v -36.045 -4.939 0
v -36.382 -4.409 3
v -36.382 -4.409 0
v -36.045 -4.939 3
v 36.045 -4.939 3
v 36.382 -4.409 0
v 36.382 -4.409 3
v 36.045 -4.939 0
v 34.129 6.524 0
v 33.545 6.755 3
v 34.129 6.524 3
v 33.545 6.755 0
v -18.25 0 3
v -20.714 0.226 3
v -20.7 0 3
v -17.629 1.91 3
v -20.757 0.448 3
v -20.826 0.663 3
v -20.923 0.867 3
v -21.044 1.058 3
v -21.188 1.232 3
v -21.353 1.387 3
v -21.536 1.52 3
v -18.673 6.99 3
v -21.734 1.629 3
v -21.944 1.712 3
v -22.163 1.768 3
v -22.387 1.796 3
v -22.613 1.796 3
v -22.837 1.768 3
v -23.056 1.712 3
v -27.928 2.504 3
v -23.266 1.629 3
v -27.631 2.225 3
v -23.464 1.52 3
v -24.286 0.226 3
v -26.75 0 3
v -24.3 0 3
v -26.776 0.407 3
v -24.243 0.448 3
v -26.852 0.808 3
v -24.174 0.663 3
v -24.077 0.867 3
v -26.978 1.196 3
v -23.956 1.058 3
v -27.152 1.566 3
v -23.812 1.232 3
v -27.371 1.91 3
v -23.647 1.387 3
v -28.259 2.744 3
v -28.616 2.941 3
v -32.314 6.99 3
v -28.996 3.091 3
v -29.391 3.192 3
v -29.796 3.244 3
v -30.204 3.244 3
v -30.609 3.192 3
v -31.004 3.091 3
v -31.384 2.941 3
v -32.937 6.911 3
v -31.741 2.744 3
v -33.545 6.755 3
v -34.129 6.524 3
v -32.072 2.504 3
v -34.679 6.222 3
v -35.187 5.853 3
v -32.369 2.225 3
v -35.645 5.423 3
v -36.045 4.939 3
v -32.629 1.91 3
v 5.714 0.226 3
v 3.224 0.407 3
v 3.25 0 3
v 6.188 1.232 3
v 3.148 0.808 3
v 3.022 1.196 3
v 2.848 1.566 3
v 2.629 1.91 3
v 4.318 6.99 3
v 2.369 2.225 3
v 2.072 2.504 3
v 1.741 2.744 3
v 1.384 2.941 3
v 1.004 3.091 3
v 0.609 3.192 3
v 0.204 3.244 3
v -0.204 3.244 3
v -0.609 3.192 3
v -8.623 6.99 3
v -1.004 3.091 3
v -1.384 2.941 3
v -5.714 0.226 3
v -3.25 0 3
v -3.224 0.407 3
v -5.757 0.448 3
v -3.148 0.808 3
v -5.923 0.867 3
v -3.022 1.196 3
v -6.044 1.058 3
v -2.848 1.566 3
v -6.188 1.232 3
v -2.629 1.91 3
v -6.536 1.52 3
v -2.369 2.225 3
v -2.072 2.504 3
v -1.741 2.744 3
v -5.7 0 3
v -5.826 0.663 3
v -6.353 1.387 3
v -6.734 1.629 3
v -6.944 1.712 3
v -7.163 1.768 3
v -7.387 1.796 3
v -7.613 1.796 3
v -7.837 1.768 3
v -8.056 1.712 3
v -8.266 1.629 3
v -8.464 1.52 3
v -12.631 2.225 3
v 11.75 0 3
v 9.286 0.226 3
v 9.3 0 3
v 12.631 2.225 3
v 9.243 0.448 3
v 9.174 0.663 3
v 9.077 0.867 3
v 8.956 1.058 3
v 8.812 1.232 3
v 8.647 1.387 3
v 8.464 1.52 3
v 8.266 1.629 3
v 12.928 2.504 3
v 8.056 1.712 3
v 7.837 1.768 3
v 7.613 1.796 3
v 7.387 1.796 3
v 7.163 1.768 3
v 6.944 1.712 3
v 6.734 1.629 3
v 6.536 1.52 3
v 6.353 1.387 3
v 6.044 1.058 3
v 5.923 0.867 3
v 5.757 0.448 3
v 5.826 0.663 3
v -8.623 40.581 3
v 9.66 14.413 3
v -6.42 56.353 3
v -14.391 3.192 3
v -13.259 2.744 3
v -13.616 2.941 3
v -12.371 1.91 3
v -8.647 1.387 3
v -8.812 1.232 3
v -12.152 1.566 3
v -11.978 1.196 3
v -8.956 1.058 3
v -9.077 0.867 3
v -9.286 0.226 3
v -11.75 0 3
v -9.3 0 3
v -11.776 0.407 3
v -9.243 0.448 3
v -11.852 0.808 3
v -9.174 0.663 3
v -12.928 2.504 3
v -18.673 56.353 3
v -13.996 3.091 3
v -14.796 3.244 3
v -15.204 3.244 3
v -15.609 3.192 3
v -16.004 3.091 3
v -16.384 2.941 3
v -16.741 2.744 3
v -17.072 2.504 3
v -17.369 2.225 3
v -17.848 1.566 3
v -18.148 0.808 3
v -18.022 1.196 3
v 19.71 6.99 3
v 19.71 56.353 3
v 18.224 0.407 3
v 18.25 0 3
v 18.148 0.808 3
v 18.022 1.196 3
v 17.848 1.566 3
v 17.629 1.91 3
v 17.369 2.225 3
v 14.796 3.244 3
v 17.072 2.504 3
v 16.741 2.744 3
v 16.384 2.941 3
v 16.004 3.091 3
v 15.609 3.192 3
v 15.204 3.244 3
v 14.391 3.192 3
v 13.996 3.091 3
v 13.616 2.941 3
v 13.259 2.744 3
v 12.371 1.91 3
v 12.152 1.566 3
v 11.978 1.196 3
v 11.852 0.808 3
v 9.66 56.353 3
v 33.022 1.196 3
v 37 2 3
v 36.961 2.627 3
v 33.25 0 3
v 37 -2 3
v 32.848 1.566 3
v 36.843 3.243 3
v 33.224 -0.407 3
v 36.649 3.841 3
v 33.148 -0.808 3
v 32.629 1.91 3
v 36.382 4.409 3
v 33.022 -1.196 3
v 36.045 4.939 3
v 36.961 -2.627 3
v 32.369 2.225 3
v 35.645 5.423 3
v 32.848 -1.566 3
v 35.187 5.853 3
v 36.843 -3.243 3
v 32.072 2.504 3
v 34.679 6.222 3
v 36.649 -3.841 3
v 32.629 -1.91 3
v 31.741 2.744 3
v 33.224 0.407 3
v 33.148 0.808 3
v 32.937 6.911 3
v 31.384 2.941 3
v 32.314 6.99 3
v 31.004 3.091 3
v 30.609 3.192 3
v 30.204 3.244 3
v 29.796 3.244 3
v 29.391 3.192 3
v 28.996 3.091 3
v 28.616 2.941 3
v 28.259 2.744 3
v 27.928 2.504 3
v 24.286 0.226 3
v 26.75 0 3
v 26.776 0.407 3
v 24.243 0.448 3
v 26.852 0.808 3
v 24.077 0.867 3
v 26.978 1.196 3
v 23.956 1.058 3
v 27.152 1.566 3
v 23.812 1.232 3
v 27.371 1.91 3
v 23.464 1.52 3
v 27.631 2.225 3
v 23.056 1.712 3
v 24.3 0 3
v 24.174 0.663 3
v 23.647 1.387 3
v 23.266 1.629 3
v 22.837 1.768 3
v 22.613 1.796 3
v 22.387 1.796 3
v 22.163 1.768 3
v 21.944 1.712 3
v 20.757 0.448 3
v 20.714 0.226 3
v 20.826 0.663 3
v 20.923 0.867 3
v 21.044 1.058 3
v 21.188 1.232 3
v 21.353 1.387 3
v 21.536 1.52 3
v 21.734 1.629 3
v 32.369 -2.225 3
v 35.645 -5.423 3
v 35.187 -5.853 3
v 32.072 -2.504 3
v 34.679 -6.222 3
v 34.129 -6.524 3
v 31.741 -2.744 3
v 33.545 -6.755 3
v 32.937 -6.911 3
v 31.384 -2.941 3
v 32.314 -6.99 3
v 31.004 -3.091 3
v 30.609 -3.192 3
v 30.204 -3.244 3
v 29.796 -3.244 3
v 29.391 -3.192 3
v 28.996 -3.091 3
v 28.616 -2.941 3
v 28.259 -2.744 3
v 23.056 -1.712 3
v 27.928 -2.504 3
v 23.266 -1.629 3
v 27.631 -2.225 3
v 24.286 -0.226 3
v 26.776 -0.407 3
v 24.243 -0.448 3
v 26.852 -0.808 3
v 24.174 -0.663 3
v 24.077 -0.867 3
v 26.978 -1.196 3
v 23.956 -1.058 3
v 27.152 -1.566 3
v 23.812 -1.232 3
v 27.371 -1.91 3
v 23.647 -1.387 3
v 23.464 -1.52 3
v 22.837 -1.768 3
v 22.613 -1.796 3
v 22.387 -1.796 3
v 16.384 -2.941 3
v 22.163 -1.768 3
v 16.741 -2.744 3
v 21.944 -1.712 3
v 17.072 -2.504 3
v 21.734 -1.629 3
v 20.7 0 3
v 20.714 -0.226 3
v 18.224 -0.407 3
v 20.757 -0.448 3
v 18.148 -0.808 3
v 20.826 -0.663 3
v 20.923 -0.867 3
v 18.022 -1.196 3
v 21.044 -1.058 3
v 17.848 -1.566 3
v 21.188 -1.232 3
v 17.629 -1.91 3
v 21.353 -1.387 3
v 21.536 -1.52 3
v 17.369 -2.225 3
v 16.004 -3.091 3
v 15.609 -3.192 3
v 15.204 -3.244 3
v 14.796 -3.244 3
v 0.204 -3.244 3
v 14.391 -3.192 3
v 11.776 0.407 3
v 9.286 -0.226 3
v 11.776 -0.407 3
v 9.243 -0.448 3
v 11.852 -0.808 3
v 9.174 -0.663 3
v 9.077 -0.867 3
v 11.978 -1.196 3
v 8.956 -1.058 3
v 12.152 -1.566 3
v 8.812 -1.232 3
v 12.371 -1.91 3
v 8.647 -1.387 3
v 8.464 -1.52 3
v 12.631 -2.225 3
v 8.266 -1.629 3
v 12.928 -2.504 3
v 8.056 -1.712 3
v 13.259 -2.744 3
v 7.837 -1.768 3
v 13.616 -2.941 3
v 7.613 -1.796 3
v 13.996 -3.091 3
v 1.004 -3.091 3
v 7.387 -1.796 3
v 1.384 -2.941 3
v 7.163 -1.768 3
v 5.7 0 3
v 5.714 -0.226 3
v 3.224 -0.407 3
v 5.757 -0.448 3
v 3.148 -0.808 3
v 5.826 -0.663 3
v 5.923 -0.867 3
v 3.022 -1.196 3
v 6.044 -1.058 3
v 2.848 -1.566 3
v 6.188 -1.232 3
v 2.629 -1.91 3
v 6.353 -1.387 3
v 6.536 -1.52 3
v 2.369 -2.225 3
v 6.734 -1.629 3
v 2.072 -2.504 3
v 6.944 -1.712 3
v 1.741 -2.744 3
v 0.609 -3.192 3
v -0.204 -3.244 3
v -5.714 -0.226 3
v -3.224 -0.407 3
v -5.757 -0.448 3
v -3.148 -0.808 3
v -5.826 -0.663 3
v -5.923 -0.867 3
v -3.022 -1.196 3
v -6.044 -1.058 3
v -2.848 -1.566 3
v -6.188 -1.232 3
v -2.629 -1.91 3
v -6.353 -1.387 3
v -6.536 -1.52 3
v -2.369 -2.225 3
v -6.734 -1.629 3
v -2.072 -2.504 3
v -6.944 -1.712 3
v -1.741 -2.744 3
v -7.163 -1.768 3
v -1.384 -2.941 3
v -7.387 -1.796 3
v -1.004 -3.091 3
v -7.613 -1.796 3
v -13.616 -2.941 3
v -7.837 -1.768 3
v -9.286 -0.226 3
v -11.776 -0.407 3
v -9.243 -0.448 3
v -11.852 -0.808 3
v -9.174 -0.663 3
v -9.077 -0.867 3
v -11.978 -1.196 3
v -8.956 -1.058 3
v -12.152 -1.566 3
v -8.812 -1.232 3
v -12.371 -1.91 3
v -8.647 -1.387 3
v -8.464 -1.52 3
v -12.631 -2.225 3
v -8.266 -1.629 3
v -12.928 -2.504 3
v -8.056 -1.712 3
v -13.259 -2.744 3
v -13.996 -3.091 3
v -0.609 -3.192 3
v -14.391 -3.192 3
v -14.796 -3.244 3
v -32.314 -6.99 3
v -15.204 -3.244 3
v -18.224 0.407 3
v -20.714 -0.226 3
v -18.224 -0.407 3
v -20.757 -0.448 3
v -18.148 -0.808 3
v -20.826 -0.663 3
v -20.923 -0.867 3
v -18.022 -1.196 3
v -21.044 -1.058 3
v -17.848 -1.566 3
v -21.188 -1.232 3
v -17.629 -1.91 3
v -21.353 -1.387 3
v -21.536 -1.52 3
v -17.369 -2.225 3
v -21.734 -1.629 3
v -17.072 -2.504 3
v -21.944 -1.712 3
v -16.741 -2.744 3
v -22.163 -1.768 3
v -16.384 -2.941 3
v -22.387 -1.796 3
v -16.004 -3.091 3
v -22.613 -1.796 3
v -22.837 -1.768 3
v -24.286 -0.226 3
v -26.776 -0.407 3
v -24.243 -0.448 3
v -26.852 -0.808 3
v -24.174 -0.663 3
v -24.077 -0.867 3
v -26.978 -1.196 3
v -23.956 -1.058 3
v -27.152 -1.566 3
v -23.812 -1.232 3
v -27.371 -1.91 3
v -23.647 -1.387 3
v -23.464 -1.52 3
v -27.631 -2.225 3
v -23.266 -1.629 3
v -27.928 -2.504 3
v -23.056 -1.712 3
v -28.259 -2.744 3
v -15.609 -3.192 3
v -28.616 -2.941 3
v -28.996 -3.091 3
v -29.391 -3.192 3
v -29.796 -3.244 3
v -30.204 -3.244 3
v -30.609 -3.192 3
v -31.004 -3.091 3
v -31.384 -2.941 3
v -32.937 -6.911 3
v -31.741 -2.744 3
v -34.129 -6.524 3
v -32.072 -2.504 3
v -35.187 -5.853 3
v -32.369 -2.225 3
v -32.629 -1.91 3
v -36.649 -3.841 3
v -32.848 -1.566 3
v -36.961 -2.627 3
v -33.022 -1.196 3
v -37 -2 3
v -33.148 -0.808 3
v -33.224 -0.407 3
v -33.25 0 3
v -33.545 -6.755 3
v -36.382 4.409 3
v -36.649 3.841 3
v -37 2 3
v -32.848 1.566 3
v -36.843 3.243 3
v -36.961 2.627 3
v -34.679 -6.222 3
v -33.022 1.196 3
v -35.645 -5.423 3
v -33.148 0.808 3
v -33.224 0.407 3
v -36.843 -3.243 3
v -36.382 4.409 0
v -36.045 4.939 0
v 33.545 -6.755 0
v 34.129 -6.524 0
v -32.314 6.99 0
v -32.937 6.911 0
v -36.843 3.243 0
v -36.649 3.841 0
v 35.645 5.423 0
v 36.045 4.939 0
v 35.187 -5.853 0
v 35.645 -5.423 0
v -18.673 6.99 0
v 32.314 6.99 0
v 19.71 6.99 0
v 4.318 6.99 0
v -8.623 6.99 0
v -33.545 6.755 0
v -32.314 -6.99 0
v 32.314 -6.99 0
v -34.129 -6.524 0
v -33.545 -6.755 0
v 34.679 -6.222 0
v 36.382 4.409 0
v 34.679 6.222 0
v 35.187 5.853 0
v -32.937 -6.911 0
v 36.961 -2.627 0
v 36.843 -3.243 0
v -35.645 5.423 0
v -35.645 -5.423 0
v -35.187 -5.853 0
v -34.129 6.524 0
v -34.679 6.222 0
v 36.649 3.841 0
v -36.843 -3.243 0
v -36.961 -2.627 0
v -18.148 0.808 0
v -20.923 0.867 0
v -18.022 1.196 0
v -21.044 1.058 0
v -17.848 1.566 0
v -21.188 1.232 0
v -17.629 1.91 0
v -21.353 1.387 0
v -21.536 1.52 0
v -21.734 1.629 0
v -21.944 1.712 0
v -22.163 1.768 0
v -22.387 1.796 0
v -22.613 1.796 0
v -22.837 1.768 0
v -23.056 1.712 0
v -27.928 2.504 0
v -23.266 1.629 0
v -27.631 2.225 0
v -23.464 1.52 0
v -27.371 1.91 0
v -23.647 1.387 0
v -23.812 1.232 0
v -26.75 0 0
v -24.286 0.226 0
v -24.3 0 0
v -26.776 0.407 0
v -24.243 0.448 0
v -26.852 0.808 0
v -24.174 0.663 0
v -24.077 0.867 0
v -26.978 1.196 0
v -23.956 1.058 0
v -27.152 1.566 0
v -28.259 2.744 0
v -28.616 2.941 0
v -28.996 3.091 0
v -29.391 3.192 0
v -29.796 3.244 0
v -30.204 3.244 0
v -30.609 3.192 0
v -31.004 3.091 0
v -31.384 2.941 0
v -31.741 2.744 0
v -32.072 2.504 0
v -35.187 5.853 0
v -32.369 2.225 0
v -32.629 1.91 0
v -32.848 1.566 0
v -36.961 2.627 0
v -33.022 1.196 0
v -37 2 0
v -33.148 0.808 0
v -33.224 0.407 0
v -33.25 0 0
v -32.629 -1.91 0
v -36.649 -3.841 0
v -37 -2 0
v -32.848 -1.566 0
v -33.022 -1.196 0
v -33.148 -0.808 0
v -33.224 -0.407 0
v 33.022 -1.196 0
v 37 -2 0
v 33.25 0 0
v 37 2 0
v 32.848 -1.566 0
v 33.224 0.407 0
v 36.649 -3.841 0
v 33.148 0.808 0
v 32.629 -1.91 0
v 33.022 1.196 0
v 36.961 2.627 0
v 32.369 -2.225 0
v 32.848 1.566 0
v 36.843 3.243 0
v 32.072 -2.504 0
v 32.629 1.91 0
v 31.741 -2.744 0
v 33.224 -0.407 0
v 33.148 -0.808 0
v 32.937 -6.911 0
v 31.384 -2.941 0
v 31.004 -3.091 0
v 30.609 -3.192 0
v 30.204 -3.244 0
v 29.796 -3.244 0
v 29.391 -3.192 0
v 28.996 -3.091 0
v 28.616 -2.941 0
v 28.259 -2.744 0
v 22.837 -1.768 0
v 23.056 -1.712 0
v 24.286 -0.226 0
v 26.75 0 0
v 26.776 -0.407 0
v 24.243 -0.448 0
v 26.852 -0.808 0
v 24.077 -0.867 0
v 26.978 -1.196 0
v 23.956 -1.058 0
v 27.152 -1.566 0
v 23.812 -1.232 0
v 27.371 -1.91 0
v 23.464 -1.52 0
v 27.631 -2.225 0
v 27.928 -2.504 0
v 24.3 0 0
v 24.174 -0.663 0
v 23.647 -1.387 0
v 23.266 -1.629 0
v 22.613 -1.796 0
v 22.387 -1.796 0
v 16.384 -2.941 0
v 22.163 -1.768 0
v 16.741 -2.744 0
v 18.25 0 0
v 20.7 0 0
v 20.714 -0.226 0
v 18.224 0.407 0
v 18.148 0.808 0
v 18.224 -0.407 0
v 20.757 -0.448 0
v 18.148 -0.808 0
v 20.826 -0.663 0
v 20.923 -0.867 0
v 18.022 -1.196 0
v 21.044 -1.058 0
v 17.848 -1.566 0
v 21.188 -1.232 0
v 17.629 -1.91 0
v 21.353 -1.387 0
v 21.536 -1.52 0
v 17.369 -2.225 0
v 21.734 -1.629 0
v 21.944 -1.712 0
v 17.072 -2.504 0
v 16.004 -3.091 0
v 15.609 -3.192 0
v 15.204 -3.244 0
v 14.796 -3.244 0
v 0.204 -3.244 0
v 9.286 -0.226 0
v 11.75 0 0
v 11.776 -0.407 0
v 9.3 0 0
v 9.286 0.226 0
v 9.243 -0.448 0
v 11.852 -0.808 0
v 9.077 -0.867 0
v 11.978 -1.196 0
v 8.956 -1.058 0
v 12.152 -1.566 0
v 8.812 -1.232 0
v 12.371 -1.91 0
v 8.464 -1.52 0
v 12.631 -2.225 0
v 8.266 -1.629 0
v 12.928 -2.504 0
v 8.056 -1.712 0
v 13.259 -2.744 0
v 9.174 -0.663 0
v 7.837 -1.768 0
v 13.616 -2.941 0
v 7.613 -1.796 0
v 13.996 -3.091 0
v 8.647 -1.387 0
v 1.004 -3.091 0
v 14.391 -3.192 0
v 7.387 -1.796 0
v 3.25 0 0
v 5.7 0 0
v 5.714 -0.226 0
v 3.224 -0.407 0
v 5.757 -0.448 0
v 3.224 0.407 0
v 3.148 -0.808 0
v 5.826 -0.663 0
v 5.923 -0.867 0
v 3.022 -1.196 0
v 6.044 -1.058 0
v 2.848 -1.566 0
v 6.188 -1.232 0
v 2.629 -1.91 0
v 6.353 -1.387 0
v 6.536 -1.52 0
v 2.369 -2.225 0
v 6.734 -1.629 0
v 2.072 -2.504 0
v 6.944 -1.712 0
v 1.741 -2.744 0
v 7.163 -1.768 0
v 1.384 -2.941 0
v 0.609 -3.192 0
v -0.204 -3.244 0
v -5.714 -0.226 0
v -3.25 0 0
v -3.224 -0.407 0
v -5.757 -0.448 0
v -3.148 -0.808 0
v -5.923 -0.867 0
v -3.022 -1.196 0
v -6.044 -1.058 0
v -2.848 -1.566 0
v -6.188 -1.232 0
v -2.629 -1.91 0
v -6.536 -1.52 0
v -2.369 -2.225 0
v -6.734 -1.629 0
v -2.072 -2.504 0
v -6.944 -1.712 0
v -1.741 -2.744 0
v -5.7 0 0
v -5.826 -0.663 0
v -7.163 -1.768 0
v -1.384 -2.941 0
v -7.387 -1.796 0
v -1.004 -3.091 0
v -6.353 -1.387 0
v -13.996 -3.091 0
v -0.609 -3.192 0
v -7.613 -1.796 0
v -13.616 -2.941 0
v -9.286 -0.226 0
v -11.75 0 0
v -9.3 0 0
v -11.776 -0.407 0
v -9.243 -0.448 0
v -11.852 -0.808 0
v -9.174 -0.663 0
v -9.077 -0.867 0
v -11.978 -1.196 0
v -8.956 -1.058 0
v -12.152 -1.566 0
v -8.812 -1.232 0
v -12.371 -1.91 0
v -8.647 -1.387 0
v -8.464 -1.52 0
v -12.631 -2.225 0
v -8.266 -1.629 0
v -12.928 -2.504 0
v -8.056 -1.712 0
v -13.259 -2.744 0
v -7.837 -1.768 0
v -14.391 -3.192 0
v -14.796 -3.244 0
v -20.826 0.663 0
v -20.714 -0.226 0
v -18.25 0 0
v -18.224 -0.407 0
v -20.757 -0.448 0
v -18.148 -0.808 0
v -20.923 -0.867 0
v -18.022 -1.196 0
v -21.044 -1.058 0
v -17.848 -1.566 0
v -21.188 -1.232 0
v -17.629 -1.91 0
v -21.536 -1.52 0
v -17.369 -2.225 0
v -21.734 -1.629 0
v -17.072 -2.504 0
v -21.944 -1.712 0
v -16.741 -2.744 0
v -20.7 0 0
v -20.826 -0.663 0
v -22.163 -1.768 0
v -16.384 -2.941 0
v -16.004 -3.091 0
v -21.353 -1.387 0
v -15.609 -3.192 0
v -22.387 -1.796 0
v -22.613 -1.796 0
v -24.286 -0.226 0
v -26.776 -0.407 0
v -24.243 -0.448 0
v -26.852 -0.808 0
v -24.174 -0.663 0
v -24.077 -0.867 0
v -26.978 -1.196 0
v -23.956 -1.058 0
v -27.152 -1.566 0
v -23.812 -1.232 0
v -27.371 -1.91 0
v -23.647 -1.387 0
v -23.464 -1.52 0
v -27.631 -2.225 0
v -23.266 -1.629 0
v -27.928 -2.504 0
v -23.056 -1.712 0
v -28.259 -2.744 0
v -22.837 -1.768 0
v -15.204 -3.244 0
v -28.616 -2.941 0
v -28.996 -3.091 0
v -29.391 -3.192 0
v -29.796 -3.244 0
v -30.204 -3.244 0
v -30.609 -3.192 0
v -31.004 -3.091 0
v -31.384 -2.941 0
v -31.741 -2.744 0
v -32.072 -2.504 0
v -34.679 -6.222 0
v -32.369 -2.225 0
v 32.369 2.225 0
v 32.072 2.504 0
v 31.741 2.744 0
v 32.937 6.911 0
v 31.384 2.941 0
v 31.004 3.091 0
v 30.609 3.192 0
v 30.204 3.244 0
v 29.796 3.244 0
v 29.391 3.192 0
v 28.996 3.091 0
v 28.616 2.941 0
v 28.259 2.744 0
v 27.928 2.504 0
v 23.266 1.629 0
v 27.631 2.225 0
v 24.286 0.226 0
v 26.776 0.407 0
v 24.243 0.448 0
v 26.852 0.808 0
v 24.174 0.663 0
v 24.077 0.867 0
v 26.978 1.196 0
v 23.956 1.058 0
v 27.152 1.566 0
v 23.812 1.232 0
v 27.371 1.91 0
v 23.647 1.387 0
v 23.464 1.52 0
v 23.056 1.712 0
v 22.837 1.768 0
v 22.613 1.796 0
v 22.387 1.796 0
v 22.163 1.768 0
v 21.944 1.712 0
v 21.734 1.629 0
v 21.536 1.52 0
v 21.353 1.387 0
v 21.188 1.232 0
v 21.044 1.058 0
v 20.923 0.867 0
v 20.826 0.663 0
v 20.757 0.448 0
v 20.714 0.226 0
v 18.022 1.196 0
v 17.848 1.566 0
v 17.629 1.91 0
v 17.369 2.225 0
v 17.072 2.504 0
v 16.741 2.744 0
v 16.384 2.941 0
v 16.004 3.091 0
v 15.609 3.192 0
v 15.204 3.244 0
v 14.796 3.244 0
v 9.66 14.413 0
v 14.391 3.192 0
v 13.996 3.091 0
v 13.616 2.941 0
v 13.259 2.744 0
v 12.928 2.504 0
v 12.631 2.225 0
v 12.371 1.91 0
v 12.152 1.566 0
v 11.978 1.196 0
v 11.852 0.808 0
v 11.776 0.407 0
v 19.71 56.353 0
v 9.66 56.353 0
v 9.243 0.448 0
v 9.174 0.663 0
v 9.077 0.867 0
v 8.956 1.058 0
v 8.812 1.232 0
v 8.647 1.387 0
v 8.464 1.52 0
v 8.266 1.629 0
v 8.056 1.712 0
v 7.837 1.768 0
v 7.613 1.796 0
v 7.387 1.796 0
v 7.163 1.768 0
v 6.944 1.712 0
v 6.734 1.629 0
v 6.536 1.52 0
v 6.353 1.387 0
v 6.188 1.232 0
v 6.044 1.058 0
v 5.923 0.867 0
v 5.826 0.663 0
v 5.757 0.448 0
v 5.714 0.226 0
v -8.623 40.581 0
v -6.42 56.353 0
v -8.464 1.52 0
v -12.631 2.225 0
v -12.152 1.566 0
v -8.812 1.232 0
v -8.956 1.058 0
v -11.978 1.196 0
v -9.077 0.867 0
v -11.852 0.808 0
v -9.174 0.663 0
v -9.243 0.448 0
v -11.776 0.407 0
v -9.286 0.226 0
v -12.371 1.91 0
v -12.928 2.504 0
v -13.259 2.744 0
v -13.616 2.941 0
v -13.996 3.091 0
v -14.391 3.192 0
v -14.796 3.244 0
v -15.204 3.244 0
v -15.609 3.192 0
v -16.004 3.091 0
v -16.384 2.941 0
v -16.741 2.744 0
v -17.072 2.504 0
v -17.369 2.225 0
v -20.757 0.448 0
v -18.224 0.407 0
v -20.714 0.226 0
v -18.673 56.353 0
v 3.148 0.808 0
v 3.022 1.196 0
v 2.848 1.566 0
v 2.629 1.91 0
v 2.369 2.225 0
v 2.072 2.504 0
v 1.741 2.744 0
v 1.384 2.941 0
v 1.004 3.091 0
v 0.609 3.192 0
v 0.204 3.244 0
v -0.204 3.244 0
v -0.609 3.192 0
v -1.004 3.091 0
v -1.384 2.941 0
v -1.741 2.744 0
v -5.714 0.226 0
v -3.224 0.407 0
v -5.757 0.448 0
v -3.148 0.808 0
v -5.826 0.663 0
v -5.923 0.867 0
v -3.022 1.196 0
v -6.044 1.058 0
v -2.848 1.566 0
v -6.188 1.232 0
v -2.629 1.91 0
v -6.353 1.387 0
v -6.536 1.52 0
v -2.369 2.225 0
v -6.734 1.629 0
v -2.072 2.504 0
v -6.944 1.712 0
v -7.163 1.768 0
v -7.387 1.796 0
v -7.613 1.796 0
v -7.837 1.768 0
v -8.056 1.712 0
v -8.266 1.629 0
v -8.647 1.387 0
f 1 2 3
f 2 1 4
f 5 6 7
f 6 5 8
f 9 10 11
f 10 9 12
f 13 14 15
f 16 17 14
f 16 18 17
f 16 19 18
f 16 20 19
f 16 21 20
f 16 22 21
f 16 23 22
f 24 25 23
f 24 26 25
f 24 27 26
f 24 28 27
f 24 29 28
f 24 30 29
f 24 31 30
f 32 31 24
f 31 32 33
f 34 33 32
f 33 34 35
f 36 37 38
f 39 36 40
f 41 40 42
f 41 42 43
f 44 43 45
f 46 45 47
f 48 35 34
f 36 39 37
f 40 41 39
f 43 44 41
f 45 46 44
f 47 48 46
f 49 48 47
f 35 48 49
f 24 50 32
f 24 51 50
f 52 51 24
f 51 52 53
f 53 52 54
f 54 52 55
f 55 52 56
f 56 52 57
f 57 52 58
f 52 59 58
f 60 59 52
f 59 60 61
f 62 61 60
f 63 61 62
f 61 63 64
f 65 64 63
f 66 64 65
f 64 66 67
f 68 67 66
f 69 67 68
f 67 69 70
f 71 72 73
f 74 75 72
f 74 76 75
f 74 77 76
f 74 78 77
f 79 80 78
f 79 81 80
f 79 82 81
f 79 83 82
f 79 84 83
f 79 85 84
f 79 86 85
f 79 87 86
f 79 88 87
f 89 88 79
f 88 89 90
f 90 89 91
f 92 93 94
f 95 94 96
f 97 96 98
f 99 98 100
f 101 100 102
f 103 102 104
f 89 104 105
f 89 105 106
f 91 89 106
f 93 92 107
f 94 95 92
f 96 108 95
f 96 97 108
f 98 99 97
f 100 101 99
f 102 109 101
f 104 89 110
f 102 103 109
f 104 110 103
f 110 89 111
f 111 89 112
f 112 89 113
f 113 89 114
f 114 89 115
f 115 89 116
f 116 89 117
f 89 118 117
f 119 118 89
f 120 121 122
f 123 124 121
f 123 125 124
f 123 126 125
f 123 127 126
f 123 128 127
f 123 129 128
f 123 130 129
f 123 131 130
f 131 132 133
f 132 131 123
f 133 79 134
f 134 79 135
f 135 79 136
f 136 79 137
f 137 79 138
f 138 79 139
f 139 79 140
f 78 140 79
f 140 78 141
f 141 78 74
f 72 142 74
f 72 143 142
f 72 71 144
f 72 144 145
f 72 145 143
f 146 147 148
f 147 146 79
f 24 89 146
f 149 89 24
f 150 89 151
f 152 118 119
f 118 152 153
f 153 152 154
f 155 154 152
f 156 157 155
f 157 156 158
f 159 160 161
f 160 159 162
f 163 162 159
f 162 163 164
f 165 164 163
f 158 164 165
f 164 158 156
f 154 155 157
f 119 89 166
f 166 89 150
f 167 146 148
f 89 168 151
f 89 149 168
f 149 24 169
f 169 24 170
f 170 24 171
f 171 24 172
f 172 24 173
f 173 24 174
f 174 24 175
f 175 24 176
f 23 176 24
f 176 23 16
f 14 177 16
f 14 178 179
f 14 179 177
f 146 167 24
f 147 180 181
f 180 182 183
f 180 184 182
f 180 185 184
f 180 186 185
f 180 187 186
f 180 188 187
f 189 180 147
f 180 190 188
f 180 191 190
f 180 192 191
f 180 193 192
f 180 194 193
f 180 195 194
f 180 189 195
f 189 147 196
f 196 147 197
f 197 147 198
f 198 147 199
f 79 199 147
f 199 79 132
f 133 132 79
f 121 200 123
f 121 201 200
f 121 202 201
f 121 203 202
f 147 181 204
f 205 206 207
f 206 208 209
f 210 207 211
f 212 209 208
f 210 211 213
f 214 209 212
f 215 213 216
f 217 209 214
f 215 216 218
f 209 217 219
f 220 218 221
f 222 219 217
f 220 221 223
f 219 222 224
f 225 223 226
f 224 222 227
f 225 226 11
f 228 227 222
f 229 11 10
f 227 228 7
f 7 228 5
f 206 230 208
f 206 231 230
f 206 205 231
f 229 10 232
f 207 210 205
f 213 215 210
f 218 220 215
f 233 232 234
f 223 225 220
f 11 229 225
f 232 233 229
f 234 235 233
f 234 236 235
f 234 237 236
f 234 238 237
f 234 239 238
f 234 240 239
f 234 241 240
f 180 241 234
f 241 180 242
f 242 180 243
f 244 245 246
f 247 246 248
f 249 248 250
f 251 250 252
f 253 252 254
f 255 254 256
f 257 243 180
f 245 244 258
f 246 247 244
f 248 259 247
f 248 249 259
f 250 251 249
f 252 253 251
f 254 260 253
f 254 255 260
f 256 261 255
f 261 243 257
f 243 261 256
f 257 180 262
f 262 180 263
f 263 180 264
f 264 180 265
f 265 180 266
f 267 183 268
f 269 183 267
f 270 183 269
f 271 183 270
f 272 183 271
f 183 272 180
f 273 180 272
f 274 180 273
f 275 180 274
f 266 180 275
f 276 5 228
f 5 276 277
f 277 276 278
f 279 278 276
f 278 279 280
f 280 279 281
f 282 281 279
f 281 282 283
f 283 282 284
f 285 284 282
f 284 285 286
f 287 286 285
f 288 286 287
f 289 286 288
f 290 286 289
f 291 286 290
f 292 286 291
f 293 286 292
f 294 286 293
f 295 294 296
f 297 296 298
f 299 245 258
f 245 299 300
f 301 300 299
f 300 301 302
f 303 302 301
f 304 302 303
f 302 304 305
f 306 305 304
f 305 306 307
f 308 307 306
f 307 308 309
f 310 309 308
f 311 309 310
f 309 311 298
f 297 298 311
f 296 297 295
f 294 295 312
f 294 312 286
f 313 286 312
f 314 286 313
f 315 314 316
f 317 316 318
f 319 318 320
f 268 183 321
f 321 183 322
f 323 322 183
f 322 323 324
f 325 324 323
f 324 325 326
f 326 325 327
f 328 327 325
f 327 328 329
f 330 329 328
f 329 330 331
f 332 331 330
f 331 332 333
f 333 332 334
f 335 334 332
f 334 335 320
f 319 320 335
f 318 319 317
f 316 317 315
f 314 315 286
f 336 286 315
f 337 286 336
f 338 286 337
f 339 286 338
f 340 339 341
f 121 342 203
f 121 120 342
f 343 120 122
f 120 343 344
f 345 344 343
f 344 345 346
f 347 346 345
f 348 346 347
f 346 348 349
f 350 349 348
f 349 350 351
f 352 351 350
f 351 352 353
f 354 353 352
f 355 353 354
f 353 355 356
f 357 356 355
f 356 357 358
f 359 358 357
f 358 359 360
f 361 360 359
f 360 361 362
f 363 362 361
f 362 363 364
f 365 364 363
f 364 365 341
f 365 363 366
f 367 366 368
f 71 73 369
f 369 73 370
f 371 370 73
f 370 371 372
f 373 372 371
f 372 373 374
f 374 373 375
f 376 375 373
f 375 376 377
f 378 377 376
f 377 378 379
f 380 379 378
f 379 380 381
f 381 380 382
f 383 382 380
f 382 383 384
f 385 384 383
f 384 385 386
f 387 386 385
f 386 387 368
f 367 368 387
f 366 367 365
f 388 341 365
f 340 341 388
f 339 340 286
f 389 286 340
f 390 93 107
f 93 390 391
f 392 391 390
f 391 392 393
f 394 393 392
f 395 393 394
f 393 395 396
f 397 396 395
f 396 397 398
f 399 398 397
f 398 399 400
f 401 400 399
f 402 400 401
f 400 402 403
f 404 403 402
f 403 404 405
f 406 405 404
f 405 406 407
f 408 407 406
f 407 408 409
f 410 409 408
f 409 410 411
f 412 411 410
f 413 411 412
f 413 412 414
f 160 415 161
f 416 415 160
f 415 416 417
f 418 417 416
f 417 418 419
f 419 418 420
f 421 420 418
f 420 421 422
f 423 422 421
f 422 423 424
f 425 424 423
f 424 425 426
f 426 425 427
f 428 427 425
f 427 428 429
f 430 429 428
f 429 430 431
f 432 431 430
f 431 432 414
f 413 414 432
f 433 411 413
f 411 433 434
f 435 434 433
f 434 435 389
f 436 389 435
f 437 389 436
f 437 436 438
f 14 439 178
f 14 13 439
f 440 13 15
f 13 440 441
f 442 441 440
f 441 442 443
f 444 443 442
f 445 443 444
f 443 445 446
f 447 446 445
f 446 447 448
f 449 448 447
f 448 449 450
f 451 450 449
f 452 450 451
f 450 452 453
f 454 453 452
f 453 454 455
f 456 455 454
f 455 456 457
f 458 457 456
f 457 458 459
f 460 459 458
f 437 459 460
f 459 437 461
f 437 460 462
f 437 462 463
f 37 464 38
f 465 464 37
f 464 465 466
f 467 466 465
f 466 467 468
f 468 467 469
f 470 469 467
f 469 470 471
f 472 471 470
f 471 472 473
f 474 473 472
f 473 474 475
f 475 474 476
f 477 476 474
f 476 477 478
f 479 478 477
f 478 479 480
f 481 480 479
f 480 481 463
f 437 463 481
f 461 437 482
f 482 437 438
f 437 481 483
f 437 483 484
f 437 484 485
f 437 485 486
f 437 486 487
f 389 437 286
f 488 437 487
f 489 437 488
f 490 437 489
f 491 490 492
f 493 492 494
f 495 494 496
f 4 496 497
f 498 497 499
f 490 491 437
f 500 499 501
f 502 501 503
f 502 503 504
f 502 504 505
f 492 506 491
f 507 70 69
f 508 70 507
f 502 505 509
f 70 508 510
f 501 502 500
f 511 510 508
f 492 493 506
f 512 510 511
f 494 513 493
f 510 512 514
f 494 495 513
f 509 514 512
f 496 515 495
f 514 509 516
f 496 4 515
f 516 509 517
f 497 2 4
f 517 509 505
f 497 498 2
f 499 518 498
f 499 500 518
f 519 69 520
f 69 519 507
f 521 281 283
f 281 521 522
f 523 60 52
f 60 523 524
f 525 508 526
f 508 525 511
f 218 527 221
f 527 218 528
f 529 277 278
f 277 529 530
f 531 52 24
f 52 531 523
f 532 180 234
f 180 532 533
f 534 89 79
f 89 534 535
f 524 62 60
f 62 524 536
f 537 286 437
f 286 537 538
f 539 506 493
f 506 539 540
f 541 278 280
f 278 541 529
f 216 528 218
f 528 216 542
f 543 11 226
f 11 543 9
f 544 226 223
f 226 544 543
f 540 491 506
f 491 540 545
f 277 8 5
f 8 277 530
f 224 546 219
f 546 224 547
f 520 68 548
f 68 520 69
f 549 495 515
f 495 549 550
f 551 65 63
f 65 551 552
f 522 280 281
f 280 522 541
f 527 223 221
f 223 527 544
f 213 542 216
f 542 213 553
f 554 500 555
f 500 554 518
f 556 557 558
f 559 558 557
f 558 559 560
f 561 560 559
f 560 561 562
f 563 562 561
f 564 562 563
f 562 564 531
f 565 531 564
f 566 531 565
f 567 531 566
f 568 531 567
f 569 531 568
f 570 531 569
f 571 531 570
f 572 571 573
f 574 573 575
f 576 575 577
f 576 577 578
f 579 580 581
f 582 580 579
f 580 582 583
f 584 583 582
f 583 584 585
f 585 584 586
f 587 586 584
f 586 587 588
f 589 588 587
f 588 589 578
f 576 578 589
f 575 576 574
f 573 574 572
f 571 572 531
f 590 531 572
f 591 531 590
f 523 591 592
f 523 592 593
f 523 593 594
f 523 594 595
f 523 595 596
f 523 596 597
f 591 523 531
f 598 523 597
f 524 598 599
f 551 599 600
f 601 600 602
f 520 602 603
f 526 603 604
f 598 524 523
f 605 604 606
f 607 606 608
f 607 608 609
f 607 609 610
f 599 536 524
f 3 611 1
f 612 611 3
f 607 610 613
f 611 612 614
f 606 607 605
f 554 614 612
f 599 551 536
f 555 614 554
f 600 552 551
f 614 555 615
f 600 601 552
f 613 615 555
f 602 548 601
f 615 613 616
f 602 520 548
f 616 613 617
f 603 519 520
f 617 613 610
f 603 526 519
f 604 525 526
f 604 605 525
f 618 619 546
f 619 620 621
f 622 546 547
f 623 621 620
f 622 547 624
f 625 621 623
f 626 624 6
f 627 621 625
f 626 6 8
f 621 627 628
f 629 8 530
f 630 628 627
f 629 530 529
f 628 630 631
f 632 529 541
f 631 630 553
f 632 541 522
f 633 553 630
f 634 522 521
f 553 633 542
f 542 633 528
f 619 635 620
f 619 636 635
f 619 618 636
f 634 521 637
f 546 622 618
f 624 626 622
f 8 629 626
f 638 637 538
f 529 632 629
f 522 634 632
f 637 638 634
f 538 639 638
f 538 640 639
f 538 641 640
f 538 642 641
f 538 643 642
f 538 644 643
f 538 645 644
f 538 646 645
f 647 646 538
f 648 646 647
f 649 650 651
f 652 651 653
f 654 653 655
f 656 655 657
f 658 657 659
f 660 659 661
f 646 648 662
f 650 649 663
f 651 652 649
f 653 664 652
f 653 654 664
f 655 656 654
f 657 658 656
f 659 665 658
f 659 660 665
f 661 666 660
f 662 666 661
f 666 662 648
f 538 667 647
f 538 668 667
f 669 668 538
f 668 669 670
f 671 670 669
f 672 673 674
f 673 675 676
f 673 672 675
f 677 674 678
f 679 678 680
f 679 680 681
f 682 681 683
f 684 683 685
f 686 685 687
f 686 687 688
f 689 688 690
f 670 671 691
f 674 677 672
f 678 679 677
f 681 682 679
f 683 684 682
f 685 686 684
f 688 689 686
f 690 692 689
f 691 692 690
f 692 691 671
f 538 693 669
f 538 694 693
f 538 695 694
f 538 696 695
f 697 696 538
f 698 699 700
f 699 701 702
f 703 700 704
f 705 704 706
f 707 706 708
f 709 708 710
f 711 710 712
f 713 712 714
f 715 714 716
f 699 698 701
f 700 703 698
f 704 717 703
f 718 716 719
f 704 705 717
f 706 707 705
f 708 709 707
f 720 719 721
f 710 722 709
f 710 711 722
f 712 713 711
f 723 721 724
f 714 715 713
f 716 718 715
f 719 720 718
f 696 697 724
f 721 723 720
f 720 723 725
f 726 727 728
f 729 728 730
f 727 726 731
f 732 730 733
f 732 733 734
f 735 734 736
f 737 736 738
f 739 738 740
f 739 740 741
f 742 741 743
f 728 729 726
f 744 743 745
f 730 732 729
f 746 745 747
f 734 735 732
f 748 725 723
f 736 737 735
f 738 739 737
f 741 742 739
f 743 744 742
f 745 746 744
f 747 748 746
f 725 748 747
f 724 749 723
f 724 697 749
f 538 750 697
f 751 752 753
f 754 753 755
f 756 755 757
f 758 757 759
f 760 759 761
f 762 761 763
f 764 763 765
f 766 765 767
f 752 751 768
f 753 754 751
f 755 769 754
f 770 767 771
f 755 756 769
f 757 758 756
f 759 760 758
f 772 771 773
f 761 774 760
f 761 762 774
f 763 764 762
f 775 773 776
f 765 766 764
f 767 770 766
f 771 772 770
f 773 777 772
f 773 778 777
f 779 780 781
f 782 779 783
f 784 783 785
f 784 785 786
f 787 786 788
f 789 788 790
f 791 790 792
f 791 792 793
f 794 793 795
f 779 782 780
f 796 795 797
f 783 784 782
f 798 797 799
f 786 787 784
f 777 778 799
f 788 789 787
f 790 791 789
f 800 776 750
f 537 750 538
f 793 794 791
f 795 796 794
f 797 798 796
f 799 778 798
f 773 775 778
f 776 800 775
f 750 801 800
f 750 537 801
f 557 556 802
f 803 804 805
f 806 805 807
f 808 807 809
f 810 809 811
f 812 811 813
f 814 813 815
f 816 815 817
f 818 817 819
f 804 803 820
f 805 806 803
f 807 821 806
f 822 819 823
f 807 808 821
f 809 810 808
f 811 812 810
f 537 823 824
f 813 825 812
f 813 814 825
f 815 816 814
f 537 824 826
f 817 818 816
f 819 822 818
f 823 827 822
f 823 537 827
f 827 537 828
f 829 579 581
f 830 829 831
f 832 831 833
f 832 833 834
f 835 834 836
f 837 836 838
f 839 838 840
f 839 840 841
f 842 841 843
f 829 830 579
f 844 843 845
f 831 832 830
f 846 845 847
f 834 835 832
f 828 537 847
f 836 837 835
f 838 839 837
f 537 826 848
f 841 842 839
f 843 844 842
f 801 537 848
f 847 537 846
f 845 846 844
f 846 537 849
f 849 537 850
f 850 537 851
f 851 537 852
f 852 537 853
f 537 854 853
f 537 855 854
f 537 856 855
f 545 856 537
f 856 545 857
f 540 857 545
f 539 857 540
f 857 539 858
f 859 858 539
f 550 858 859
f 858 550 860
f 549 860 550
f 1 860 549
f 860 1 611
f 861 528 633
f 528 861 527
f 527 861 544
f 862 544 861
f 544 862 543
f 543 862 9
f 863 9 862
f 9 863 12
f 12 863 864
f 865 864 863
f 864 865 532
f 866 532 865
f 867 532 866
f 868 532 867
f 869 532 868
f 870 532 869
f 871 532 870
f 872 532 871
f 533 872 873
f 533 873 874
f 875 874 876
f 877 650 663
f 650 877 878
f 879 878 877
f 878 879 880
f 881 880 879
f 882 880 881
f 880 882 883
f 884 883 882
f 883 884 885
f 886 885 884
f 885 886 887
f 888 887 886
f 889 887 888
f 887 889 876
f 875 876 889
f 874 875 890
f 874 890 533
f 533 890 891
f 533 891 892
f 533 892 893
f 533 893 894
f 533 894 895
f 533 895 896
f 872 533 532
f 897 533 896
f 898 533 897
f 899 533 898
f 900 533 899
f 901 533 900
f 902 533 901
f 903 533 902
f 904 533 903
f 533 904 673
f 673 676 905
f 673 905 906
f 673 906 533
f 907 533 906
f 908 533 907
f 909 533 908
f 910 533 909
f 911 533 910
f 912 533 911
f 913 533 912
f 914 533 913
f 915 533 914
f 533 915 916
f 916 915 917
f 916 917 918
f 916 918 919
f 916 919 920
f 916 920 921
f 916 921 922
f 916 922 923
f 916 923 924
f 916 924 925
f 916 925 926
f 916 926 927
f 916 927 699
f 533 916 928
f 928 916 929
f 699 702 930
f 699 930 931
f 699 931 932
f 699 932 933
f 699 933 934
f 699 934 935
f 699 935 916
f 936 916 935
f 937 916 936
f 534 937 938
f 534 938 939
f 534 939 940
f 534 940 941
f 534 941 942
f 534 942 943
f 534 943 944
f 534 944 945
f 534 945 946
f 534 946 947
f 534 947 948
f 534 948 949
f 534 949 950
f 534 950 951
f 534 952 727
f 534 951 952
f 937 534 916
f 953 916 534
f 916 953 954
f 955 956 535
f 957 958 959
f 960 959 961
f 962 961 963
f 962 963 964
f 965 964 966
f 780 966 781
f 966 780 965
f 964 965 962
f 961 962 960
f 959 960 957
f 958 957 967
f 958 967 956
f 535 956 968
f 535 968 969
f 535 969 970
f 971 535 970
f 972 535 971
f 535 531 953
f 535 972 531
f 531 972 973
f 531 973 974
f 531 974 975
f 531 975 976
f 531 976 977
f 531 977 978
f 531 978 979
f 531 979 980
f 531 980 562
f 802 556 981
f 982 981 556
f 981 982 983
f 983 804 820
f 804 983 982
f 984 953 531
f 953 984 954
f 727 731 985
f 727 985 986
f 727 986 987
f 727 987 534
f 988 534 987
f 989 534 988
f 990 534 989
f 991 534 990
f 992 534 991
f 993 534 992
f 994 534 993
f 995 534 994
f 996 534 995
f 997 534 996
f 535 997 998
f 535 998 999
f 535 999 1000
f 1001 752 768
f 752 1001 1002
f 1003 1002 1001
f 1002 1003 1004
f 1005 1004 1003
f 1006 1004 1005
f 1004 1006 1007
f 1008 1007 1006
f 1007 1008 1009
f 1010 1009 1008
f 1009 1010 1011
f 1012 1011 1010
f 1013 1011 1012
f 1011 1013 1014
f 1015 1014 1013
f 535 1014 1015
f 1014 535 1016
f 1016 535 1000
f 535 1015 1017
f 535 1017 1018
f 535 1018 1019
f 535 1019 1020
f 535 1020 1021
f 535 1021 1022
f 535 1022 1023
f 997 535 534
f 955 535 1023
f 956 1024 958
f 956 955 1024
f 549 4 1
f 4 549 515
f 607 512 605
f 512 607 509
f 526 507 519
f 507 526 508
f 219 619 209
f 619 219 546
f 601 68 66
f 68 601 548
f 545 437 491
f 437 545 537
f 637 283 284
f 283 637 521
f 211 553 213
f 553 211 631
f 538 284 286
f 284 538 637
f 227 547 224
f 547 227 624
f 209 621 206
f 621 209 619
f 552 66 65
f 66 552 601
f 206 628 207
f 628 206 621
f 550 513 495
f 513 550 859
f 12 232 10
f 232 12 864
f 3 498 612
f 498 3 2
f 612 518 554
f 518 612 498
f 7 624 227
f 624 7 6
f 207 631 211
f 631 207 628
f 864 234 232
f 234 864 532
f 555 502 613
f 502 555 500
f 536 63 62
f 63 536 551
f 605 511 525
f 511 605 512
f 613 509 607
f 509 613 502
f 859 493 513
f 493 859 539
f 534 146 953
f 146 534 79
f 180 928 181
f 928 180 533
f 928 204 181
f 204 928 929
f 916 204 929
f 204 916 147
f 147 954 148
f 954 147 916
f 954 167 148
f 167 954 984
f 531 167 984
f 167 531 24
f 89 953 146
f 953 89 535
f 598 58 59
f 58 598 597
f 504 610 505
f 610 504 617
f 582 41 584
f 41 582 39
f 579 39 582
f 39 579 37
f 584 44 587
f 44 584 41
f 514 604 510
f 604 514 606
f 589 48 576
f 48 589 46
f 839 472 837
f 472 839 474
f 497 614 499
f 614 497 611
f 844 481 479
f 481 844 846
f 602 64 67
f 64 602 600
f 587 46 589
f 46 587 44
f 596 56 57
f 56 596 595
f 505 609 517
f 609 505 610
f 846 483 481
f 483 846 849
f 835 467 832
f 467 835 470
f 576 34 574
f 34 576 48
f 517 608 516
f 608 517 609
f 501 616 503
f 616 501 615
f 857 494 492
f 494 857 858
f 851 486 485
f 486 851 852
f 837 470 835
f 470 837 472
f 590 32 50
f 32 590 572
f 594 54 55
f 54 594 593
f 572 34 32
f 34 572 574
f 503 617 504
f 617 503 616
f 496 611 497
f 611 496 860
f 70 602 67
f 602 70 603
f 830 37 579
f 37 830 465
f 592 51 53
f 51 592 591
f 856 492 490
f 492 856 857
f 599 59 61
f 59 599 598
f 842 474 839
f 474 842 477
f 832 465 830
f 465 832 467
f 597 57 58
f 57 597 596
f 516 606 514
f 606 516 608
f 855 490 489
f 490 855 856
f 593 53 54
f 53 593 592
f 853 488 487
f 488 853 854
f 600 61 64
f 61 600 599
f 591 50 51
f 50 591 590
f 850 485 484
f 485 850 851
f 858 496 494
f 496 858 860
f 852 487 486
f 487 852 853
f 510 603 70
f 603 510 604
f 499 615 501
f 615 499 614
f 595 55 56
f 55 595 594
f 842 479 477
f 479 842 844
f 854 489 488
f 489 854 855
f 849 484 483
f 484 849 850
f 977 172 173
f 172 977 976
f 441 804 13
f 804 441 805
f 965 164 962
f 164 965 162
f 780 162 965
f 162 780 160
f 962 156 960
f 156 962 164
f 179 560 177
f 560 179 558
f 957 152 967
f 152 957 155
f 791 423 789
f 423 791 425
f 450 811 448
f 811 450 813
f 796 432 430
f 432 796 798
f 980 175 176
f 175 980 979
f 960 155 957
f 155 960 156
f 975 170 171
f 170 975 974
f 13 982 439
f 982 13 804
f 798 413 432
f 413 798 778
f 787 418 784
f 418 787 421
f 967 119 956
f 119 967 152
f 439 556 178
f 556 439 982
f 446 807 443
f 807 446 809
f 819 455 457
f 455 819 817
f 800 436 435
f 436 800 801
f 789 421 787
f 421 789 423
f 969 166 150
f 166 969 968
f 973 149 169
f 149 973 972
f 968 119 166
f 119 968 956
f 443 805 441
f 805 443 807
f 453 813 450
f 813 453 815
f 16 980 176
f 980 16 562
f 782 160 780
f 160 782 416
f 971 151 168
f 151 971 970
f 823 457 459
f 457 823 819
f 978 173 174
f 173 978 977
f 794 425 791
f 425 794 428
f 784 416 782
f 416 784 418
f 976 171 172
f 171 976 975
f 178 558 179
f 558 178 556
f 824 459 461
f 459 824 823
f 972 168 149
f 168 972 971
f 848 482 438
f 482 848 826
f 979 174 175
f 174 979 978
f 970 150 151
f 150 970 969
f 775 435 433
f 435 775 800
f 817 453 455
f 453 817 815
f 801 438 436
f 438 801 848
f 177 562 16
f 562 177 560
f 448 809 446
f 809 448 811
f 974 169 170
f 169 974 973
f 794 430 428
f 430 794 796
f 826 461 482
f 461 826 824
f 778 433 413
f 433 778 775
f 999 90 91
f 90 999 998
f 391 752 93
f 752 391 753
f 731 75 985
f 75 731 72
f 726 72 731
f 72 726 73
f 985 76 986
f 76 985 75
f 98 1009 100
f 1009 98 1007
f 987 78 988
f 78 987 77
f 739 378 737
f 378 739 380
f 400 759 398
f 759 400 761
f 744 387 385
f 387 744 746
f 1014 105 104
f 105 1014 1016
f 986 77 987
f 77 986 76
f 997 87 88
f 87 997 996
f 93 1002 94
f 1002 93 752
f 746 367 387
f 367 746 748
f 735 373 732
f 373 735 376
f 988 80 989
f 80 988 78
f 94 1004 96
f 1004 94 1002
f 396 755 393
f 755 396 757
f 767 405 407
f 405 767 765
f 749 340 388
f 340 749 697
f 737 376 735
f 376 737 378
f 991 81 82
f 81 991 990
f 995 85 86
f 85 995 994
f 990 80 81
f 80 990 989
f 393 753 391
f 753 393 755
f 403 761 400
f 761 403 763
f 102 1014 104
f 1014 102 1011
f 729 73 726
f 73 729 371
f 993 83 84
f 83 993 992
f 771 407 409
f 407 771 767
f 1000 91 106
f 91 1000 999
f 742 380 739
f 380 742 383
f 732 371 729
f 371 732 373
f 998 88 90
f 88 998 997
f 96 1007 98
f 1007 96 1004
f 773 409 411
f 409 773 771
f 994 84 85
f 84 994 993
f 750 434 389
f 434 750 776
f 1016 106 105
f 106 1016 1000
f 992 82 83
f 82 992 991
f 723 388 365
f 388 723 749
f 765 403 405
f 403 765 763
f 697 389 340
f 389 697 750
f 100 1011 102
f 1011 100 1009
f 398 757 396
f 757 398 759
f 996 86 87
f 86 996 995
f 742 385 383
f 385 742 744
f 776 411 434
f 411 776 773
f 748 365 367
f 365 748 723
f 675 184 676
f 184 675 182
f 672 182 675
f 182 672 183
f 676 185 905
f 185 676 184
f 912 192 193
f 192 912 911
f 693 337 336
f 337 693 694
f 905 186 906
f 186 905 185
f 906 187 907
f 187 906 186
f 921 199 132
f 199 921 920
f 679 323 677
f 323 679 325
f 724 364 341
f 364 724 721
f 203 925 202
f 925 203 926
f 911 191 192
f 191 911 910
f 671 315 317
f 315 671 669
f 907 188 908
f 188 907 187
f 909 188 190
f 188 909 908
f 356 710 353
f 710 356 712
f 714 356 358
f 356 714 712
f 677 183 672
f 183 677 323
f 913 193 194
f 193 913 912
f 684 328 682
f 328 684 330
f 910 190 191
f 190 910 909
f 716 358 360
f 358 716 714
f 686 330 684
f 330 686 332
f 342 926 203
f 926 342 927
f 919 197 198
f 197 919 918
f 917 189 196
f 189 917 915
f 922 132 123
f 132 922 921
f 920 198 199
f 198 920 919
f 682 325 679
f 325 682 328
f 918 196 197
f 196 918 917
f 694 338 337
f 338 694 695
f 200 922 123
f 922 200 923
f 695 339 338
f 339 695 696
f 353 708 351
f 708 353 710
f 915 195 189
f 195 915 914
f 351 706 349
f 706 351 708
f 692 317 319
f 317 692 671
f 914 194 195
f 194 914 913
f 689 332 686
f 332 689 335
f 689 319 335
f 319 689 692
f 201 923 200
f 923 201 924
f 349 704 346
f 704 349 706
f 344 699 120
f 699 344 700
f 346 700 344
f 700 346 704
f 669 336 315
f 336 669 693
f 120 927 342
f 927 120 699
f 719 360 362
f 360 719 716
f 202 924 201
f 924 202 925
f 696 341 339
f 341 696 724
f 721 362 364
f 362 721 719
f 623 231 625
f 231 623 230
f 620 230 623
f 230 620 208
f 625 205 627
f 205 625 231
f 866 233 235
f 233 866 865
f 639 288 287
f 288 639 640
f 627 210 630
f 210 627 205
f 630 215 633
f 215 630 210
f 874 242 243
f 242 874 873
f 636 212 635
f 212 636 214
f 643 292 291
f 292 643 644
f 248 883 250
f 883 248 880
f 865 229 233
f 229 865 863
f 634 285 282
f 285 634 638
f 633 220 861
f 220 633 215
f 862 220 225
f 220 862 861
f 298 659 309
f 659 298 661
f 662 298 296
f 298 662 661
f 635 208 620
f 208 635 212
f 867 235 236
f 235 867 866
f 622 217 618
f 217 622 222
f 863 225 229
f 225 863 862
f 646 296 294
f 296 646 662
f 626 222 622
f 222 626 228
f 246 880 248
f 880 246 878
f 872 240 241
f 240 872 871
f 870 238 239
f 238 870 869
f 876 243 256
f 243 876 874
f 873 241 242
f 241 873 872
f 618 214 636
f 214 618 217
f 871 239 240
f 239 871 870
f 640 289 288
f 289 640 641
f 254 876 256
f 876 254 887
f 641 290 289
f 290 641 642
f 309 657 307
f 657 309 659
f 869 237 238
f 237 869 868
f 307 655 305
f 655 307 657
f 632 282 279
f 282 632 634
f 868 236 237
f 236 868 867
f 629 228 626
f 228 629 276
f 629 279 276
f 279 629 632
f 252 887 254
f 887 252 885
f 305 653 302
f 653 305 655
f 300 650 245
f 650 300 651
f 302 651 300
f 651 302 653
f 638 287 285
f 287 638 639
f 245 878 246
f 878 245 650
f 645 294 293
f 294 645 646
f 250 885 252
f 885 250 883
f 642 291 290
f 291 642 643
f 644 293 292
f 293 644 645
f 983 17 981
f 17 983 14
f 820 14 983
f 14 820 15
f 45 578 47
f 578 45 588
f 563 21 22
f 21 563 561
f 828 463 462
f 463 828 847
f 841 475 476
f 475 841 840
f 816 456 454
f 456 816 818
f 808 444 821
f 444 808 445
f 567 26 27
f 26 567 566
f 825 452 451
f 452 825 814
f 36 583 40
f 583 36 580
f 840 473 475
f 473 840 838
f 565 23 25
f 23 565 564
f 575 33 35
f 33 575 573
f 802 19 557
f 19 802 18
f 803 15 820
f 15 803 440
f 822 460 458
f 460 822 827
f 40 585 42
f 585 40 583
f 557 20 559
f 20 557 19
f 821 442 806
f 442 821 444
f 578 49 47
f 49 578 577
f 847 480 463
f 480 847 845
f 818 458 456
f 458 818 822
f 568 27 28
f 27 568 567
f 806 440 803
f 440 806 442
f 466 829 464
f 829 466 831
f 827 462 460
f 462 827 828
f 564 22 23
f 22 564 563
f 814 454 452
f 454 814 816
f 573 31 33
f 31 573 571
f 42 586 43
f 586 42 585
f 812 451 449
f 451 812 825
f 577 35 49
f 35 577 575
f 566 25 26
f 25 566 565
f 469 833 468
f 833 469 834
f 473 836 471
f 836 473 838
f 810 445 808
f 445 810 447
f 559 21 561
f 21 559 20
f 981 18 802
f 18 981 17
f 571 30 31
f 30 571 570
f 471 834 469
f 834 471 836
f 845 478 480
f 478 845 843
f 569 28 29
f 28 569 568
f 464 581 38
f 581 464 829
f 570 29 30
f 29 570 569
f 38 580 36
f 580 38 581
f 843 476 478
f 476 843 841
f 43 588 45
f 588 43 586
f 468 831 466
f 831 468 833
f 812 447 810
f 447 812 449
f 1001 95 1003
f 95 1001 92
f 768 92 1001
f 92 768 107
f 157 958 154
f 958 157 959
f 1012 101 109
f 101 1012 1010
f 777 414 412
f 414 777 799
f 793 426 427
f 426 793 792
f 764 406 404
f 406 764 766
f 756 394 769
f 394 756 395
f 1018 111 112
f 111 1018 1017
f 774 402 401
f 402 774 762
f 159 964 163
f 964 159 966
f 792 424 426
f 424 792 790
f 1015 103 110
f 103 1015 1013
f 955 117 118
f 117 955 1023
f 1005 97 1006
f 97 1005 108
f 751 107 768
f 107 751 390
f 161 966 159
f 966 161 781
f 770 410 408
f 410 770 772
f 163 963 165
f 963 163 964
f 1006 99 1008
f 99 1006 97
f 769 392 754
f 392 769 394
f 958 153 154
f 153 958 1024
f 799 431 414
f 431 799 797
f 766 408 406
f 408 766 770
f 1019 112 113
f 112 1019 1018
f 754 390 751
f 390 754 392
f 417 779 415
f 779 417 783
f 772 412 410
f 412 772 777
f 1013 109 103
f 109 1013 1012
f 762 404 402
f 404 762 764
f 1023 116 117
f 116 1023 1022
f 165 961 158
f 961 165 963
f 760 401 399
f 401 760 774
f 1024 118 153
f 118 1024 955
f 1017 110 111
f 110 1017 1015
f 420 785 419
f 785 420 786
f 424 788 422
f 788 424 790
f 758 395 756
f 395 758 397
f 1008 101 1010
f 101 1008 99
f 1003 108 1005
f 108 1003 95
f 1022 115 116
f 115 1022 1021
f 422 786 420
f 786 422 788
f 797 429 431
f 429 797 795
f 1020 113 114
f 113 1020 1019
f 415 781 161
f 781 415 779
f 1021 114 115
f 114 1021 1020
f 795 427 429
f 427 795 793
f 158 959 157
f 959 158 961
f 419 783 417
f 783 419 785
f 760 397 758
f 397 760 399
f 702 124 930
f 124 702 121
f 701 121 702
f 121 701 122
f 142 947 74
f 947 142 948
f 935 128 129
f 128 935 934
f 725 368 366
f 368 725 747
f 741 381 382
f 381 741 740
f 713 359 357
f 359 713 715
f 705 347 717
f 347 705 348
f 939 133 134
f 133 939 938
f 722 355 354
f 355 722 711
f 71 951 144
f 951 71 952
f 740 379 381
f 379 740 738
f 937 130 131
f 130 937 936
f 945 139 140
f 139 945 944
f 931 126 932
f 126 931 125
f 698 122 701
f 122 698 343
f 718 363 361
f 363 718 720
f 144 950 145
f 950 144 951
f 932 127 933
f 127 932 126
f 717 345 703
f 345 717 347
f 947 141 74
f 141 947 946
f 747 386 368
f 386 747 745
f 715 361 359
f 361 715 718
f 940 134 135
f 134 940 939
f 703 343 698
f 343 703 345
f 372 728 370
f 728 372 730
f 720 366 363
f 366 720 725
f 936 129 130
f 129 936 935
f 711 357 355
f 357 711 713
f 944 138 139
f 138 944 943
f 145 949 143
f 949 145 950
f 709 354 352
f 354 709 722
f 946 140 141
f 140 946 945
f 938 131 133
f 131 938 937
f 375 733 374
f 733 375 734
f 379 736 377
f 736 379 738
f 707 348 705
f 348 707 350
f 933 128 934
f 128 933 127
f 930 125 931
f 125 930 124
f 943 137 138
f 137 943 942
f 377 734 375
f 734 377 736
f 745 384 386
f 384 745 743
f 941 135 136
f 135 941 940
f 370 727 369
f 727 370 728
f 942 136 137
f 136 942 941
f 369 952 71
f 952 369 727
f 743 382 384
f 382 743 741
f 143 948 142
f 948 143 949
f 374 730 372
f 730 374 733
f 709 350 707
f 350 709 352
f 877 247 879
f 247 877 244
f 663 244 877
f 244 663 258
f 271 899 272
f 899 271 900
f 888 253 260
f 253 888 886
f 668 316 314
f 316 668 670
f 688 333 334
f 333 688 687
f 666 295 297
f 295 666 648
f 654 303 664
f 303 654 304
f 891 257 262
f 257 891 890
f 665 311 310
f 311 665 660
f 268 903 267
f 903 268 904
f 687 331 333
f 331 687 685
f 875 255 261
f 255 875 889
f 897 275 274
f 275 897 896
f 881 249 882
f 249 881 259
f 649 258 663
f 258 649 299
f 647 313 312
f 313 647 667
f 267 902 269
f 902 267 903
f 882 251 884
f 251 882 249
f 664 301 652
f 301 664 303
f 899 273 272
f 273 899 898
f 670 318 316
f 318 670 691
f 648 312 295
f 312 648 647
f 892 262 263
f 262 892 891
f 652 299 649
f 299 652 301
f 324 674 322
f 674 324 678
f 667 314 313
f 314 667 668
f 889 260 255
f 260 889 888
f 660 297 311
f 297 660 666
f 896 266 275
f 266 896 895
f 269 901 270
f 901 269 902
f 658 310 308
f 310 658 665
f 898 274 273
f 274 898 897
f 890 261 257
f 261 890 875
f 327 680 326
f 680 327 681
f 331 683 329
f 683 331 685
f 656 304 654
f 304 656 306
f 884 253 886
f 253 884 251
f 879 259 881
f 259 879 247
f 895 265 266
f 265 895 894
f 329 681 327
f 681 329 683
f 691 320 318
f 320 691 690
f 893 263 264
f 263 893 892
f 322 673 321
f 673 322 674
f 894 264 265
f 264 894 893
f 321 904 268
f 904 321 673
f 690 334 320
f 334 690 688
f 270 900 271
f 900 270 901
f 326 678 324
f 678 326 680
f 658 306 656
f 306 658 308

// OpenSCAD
$fn = 50;


difference() {
	union() {
		hull() {
			translate(v = [-32.0000000000, 2.0000000000, 0]) {
				cylinder(h = 3, r = 5);
			}
			translate(v = [32.0000000000, 2.0000000000, 0]) {
				cylinder(h = 3, r = 5);
			}
			translate(v = [-32.0000000000, -2.0000000000, 0]) {
				cylinder(h = 3, r = 5);
			}
			translate(v = [32.0000000000, -2.0000000000, 0]) {
				cylinder(h = 3, r = 5);
			}
		}
		translate(v = [0, 55, 0]) {
			linear_extrude(height = 3) {
				text(font = "DejaVu Sans Mono:style=Bold", halign = "center", size = 57.0000000000, text = "N", valign = "top");
			}
		}
	}
	union() {
		translate(v = [-30.0000000000, 0.0000000000, 0]) {
			translate(v = [0, 0, -100]) {
				cylinder(h = 200, r = 3.2500000000);
			}
		}
		translate(v = [-15.0000000000, 0.0000000000, 0]) {
			translate(v = [0, 0, -100]) {
				cylinder(h = 200, r = 3.2500000000);
			}
		}
		translate(v = [0, 0, -100]) {
			cylinder(h = 200, r = 3.2500000000);
		}
		translate(v = [15.0000000000, 0.0000000000, 0]) {
			translate(v = [0, 0, -100]) {
				cylinder(h = 200, r = 3.2500000000);
			}
		}
		translate(v = [30.0000000000, 0.0000000000, 0]) {
			translate(v = [0, 0, -100]) {
				cylinder(h = 200, r = 3.2500000000);
			}
		}
		translate(v = [-30.0000000000, 0.0000000000, 0]) {
			translate(v = [0, 0, -100]) {
				cylinder(h = 200, r = 1.8000000000);
			}
		}
		translate(v = [-22.5000000000, 0.0000000000, 0]) {
			translate(v = [0, 0, -100]) {
				cylinder(h = 200, r = 1.8000000000);
			}
		}
		translate(v = [-15.0000000000, 0.0000000000, 0]) {
			translate(v = [0, 0, -100]) {
				cylinder(h = 200, r = 1.8000000000);
			}
		}
		translate(v = [-7.5000000000, 0.0000000000, 0]) {
			translate(v = [0, 0, -100]) {
				cylinder(h = 200, r = 1.8000000000);
			}
		}
		translate(v = [0, 0, -100]) {
			cylinder(h = 200, r = 1.8000000000);
		}
		translate(v = [7.5000000000, 0.0000000000, 0]) {
			translate(v = [0, 0, -100]) {
				cylinder(h = 200, r = 1.8000000000);
			}
		}
		translate(v = [15.0000000000, 0.0000000000, 0]) {
			translate(v = [0, 0, -100]) {
				cylinder(h = 200, r = 1.8000000000);
			}
		}
		translate(v = [22.5000000000, 0.0000000000, 0]) {
			translate(v = [0, 0, -100]) {
				cylinder(h = 200, r = 1.8000000000);
			}
		}
		translate(v = [30.0000000000, 0.0000000000, 0]) {
			translate(v = [0, 0, -100]) {
				cylinder(h = 200, r = 1.8000000000);
			}
		}
	}
}
